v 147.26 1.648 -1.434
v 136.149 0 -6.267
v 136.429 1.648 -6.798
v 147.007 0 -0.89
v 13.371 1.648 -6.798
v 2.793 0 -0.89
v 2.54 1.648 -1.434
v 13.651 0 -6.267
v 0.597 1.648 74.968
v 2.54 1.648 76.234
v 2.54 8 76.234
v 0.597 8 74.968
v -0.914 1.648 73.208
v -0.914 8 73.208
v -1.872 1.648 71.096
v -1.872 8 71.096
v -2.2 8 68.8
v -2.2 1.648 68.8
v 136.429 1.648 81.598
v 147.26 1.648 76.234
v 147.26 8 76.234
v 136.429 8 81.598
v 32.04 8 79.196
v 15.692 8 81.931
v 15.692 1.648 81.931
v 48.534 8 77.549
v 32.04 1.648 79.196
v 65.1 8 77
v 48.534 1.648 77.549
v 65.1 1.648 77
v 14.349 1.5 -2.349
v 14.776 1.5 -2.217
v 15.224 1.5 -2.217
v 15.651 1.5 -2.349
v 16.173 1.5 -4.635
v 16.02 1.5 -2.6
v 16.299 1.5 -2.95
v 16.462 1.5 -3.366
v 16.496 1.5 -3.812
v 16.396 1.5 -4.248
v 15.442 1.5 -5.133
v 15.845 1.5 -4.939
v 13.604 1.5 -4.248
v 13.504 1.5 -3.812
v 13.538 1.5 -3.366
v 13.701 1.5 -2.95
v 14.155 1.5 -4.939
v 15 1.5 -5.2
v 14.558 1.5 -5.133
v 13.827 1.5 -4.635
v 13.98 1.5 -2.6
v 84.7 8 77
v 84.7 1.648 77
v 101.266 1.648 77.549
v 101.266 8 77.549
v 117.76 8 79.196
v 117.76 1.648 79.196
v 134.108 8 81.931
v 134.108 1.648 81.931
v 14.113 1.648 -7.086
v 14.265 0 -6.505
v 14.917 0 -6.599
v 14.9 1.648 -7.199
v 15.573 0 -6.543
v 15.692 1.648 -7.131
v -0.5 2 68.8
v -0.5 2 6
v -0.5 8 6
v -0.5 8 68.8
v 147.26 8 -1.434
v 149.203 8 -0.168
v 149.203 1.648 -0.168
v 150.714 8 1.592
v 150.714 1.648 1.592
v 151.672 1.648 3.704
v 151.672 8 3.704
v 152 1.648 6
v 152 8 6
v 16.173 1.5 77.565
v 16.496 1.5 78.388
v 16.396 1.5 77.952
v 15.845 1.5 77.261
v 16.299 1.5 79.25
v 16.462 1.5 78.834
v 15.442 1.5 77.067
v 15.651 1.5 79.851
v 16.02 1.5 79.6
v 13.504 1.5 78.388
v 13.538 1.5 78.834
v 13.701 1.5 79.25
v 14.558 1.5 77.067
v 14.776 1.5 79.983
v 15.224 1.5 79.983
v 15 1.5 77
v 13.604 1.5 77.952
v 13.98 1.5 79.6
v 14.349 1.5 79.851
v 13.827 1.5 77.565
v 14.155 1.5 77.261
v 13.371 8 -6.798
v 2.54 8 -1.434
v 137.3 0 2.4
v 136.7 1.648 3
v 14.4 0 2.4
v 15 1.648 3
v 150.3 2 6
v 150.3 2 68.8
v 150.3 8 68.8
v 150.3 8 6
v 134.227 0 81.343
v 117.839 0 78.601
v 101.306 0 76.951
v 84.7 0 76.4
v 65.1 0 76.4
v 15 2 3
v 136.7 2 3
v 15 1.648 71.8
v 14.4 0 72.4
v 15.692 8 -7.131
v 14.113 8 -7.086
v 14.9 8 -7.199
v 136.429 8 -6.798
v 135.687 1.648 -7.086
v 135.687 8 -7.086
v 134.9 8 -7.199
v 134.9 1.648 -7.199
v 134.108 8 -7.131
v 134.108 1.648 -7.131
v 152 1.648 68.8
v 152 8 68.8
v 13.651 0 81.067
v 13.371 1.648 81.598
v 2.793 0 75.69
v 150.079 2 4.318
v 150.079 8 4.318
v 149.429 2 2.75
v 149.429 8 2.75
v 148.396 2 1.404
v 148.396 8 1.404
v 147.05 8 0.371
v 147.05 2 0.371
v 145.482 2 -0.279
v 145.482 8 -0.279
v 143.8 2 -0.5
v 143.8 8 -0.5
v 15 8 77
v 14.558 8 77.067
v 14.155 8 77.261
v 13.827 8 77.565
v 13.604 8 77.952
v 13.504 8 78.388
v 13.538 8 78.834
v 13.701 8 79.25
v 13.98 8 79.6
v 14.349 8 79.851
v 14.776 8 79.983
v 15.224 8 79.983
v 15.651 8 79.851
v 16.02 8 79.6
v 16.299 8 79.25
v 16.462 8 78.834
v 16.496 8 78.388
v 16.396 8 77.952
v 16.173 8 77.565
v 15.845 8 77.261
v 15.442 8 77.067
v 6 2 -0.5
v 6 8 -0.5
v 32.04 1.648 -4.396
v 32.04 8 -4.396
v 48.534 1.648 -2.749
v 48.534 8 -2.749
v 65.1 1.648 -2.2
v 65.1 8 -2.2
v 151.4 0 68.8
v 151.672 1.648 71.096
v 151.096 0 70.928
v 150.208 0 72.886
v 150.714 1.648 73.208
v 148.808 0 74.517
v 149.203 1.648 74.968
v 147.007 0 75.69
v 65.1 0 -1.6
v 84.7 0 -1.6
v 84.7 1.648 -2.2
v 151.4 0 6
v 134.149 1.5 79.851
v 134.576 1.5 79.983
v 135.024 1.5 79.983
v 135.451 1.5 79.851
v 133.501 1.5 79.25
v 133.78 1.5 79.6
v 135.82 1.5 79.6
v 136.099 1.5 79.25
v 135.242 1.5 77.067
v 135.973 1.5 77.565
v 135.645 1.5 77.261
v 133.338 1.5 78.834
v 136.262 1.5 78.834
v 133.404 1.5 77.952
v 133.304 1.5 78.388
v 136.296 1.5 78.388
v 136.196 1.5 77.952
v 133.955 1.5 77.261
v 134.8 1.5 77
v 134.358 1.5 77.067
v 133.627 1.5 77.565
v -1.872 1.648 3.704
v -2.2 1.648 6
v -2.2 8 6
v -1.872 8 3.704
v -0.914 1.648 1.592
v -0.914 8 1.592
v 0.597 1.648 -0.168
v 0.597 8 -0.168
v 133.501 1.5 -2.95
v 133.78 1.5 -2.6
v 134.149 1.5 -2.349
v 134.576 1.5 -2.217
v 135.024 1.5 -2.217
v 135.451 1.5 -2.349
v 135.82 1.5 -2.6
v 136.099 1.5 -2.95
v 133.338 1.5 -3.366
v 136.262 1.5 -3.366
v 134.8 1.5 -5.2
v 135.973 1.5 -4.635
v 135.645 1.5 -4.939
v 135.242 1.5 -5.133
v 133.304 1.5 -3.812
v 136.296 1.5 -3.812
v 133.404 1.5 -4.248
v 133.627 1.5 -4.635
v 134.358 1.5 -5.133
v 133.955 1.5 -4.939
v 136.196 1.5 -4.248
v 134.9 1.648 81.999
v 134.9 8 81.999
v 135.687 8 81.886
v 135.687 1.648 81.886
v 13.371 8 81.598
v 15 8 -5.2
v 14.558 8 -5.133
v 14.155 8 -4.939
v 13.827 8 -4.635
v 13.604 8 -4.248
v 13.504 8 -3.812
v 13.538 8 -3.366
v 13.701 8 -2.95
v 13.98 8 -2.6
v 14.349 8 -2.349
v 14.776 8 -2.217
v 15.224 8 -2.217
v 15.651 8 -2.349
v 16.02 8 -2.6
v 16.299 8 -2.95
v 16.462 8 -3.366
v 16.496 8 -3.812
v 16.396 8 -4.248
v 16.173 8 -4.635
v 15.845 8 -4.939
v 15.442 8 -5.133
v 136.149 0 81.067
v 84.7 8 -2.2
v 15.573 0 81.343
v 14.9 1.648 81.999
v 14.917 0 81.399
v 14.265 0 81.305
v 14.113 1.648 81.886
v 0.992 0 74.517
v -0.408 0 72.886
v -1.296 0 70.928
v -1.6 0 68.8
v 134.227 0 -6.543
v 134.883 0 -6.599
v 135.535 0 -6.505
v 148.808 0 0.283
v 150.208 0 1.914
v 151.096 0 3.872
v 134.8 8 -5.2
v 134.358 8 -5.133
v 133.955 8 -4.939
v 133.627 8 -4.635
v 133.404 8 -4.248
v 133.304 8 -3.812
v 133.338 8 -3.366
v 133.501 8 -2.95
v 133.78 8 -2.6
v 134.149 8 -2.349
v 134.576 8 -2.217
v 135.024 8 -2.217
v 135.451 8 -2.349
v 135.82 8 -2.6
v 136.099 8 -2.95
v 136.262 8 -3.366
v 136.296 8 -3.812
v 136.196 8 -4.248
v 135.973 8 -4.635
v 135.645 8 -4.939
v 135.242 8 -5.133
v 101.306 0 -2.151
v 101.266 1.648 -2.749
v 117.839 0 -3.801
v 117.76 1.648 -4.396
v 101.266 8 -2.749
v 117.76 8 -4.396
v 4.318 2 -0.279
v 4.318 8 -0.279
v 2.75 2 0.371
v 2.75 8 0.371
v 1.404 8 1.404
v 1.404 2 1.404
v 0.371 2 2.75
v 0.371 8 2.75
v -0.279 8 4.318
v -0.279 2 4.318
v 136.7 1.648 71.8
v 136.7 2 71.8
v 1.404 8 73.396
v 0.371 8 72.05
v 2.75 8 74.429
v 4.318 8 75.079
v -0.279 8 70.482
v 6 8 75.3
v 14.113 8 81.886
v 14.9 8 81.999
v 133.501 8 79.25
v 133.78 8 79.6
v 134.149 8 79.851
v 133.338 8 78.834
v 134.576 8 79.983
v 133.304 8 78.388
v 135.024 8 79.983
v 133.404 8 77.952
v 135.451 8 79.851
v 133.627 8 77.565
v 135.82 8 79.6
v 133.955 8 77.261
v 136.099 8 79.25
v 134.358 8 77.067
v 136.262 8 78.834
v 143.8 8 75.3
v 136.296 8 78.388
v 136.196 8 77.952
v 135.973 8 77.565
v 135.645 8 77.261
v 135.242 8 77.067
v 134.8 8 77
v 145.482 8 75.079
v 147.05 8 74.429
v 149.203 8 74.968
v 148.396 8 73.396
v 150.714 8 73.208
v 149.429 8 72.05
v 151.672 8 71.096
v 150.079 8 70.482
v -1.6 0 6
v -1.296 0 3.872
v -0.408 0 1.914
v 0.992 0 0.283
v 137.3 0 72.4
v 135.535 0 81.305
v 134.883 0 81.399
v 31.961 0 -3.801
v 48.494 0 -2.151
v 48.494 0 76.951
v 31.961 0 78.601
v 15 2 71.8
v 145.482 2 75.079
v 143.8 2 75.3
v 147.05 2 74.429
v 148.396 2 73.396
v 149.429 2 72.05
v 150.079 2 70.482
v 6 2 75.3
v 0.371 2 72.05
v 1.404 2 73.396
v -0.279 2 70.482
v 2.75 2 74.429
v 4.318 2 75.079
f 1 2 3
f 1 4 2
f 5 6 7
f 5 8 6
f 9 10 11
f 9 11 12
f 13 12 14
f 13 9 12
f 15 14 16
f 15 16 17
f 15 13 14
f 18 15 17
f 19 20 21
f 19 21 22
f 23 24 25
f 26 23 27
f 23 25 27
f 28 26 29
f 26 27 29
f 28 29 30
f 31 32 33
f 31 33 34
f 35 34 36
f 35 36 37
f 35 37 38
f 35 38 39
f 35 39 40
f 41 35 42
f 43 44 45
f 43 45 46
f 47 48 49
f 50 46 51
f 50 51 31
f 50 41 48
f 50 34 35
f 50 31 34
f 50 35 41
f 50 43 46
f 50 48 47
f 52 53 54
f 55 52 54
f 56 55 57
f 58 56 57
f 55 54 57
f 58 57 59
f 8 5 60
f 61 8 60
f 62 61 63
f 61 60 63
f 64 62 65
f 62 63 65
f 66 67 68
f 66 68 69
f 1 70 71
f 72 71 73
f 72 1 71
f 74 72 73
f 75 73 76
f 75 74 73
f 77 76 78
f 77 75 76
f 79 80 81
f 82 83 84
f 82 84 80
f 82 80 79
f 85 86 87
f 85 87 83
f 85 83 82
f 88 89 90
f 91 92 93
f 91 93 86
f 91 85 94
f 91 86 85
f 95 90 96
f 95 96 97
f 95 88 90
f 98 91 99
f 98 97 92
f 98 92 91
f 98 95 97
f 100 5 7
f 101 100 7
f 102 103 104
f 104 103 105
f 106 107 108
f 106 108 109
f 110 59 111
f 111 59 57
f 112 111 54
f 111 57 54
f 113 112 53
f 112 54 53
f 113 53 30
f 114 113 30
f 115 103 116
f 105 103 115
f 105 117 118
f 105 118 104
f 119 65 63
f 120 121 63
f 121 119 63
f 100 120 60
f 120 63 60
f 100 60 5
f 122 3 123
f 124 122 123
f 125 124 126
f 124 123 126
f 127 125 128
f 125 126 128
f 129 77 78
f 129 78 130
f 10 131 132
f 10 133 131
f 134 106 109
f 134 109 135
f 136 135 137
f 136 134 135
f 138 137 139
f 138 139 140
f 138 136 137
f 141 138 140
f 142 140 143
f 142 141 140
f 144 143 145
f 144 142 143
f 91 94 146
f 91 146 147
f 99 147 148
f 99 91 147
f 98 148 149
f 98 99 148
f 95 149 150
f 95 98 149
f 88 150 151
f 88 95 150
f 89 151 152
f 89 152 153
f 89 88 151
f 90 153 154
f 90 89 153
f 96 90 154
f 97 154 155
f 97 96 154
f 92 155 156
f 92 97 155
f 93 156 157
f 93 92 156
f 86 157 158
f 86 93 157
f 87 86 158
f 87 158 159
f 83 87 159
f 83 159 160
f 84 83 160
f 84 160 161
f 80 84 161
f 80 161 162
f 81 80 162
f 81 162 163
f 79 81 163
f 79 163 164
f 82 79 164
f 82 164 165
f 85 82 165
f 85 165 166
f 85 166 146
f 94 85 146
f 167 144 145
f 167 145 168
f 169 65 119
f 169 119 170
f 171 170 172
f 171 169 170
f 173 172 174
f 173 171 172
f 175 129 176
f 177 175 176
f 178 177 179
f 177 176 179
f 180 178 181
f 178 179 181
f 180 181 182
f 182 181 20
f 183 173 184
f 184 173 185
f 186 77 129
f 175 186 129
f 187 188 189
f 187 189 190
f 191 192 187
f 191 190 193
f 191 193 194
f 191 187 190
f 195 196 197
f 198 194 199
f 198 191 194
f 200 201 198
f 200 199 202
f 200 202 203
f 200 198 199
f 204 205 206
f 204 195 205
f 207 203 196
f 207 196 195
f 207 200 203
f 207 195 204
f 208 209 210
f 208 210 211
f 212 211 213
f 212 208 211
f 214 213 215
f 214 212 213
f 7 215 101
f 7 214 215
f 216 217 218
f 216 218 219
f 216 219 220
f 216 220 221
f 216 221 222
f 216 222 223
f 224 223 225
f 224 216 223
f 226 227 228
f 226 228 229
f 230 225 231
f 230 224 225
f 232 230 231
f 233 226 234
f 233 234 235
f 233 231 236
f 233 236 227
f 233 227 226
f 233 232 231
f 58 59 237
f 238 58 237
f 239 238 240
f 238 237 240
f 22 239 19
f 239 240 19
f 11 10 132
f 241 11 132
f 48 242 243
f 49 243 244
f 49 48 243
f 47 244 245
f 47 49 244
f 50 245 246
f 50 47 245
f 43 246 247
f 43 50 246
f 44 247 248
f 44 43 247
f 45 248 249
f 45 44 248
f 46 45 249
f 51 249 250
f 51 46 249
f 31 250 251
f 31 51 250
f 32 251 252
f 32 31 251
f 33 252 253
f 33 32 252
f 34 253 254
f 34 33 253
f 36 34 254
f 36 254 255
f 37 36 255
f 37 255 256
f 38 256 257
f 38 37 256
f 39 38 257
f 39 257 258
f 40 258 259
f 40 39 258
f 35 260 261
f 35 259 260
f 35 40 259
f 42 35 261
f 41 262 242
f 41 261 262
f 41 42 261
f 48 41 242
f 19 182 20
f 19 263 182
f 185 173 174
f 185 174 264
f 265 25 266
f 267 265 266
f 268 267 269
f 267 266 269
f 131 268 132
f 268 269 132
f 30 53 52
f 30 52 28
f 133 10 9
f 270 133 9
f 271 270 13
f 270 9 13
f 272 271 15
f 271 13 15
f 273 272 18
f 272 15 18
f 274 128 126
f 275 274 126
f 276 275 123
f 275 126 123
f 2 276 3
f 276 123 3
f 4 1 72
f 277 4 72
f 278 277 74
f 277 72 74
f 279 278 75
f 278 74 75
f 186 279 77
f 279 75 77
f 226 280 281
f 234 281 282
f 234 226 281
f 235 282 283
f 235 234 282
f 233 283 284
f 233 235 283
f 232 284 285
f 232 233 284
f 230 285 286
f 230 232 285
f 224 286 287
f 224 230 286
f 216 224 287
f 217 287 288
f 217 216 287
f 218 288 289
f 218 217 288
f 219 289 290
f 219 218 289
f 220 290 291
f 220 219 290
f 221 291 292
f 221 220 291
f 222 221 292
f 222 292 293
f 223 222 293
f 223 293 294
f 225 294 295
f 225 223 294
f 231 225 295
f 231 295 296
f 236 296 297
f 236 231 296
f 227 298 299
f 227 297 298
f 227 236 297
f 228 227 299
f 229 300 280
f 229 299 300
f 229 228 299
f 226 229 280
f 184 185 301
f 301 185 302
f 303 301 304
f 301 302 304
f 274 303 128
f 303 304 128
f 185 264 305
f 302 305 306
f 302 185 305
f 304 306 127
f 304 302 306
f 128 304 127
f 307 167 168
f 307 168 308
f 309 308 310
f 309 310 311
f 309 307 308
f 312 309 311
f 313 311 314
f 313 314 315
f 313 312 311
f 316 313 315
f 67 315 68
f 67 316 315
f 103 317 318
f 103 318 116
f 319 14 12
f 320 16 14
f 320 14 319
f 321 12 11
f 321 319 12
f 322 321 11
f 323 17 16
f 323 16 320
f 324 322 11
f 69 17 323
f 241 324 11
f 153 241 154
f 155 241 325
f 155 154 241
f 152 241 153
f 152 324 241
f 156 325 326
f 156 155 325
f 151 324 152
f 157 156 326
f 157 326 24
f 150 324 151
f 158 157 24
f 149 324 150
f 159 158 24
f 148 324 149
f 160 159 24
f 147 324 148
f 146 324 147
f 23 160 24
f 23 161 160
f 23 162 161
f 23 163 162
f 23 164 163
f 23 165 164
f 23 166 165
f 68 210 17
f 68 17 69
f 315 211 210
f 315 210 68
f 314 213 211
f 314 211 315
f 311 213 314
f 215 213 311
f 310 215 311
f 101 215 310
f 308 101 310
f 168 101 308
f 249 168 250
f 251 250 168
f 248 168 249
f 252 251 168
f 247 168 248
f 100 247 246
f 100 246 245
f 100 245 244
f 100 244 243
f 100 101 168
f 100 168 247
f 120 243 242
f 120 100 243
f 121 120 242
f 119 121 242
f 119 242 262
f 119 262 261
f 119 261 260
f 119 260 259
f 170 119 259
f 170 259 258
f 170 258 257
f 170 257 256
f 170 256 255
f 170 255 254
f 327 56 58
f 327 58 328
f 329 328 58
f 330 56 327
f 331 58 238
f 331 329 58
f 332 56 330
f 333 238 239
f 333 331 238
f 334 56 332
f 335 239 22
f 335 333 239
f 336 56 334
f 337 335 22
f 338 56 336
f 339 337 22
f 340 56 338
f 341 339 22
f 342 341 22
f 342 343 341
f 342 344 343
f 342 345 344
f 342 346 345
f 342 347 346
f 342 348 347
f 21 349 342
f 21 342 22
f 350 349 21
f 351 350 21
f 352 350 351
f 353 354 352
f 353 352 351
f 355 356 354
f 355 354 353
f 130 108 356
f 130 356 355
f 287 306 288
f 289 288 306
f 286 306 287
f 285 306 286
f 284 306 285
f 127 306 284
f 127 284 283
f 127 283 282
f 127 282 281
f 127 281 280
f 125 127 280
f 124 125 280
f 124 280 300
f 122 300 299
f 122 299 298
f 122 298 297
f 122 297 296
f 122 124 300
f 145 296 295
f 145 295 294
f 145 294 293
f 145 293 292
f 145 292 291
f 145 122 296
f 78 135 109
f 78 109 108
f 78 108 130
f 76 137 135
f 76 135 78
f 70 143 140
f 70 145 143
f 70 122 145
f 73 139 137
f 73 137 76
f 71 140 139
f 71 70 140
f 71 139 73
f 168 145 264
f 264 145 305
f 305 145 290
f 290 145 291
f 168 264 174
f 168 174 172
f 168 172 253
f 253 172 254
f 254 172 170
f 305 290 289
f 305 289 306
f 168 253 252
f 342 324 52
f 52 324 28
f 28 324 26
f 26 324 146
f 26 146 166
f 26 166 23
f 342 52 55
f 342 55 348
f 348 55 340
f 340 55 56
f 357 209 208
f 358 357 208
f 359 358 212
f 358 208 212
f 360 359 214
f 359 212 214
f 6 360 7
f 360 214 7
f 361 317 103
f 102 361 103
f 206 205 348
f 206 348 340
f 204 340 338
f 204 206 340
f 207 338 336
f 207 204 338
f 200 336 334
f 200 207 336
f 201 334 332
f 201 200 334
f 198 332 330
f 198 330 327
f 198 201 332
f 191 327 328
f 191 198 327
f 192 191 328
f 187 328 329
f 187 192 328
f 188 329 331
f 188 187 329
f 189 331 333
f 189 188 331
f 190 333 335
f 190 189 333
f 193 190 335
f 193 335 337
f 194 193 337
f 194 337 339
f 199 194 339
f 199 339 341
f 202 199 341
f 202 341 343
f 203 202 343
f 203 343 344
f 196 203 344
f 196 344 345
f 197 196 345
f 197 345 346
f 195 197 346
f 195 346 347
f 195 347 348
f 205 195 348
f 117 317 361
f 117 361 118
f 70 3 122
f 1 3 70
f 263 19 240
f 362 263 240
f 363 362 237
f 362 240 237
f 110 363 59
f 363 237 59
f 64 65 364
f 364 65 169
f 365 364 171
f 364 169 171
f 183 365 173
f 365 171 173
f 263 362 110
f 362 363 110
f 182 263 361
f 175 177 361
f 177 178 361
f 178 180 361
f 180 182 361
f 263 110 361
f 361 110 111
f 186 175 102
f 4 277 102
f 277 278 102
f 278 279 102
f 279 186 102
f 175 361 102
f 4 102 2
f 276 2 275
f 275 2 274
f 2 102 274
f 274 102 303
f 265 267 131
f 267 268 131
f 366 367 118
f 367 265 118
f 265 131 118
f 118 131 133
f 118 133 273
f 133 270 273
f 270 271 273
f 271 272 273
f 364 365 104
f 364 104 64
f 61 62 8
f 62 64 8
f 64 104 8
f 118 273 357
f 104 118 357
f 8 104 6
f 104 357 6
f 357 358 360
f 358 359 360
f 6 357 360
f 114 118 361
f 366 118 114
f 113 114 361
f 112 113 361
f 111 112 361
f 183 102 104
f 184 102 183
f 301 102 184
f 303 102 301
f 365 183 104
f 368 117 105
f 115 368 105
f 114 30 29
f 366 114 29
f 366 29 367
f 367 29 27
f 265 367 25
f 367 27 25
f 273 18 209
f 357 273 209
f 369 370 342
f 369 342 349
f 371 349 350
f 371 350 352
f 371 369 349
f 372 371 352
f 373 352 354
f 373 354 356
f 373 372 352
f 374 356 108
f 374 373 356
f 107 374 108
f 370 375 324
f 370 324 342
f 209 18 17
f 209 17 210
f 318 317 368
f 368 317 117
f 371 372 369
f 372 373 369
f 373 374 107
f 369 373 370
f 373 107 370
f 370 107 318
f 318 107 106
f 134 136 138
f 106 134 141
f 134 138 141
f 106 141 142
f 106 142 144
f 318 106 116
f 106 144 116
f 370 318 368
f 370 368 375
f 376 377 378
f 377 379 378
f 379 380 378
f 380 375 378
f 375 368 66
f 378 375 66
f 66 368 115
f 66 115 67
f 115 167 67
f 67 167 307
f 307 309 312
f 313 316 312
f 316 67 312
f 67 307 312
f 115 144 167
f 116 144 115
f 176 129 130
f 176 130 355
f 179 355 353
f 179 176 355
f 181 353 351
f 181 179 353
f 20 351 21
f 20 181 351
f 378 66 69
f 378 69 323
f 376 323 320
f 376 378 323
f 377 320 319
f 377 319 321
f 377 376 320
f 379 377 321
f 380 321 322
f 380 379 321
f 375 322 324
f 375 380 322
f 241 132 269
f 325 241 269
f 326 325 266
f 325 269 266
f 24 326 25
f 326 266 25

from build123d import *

# Parameters (mm, degrees)
EXTRUDE_1_DEPTH       = 2
EXTRUDE_2_DEPTH       = 8
SKETCH_6_R            = 3.5
SKETCH_6_R_2          = 1.5
EXTRUDE_10_DEPTH      = 8
SKETCH_7_W            = 121.7
SKETCH_7_H            = 68.8
CUT_EXTRUDE_1_DEPTH   = 10
FILLET_1_R            = 250
SKETCH_6_2_R          = 1.5
EXTRUDE_11_DEPTH      = 1.5
CHAMFER_1_SIZE        = 0.6
CHAMFER_1_SIZE2       = 1.648486452
CUT_EXTRUDE_START     = -6
CUT_EXTRUDE_1_2_DEPTH = 6


with BuildPart() as part:
    # 草图1 → 凸台-拉伸1 (new body)
    with BuildSketch(Plane(origin=(0, 0, 0), x_dir=(1, 0, 0), z_dir=(0, 1, 0))):
        with BuildLine():
            Line((6, 0.2), (143.8, 0.2))
            ThreePointArc((143.8, 0.2), (148.184062043, -1.615937957), (150, -6))
            Line((150, -6), (150, -68.8))
            ThreePointArc((150, -68.8), (148.184062043, -73.184062043), (143.8, -75))
            Line((143.8, -75), (6, -75))
            ThreePointArc((6, -75), (1.615937957, -73.184062043), (-0.2, -68.8))
            Line((-0.2, -68.8), (-0.2, -6))
            ThreePointArc((-0.2, -6), (1.615937957, -1.615937957), (6, 0.2))
        make_face()
    extrude(amount=EXTRUDE_1_DEPTH)

    # 草图1<5> → 拉伸-薄壁2 (add)
    with BuildSketch(Plane(origin=(0, 0, 0), x_dir=(1, 0, 0), z_dir=(0, 1, 0))):
        with BuildLine():
            Line((6, 2.2), (143.8, 2.2))
            ThreePointArc((143.8, 2.2), (149.598275606, -0.201724394), (152, -6))
            Line((152, -6), (152, -68.8))
            ThreePointArc((152, -68.8), (149.598275606, -74.598275606), (143.8, -77))
            Line((143.8, -77), (6, -77))
            ThreePointArc((6, -77), (0.201724394, -74.598275606), (-2.2, -68.8))
            Line((-2.2, -68.8), (-2.2, -6))
            ThreePointArc((-2.2, -6), (0.201724394, -0.201724394), (6, 2.2))
        make_face()
        with BuildLine():
            Line((6, 0.2), (143.8, 0.2))
            ThreePointArc((143.8, 0.2), (148.184062043, -1.615937957), (150, -6))
            Line((150, -6), (150, -68.8))
            ThreePointArc((150, -68.8), (148.184062043, -73.184062043), (143.8, -75))
            Line((143.8, -75), (6, -75))
            ThreePointArc((6, -75), (1.615937957, -73.184062043), (-0.2, -68.8))
            Line((-0.2, -68.8), (-0.2, -6))
            ThreePointArc((-0.2, -6), (1.615937957, -1.615937957), (6, 0.2))
        make_face(mode=Mode.SUBTRACT)
    extrude(amount=EXTRUDE_2_DEPTH)

    # 草图6 → 凸台-拉伸10 (add)
    # profile 1 of 4: a face of its own
    with BuildSketch(Plane(origin=(0, 0, 0), x_dir=(1, 0, 0), z_dir=(0, 1, 0))):
        with Locations((15, 3.7)):
            Circle(SKETCH_6_R)
        with Locations(Location((15, 3.7, 0), (0, 0, 90))):
            Circle(SKETCH_6_R_2, mode=Mode.SUBTRACT)
    # profile 2 of 4: a face of its own
    with BuildSketch(Plane(origin=(0, 0, 0), x_dir=(1, 0, 0), z_dir=(0, 1, 0))):
        with Locations((15, -78.5)):
            Circle(SKETCH_6_R)
        with Locations(Location((15, -78.5, 0), (0, 0, 90))):
            Circle(SKETCH_6_R_2, mode=Mode.SUBTRACT)
    # profile 3 of 4: a face of its own
    with BuildSketch(Plane(origin=(0, 0, 0), x_dir=(1, 0, 0), z_dir=(0, 1, 0))):
        with Locations((134.8, 3.7)):
            Circle(SKETCH_6_R)
        with Locations(Location((134.8, 3.7, 0), (0, 0, 90))):
            Circle(SKETCH_6_R_2, mode=Mode.SUBTRACT)
    # profile 4 of 4: a face of its own
    with BuildSketch(Plane(origin=(0, 0, 0), x_dir=(1, 0, 0), z_dir=(0, 1, 0))):
        with Locations((134.8, -78.5)):
            Circle(SKETCH_6_R)
        with Locations(Location((134.8, -78.5, 0), (0, 0, 90))):
            Circle(SKETCH_6_R_2, mode=Mode.SUBTRACT)
    extrude(amount=EXTRUDE_10_DEPTH)

    # 草图7 → Cut-Extrude 1 (cut)
    with BuildSketch(Plane(origin=(0, 0, 0), x_dir=(-1, 0, 0), z_dir=(0, -1, 0))):
        with Locations((-75.85, -37.4)):
            Rectangle(SKETCH_7_W, SKETCH_7_H)
    extrude(amount=-CUT_EXTRUDE_1_DEPTH, mode=Mode.SUBTRACT)

    # 圆角1
    fillet_1_edges = [part.edges().sort_by_distance(p)[0] for p in [
        (18.16227766, 4, 77),
        (11.83772234, 4, 77),
        (137.96227766, 4, 77),
        (131.63772234, 4, 77),
        (131.63772234, 4, -2.2),
        (137.96227766, 4, -2.2),
        (11.83772234, 4, -2.2),
        (18.16227766, 4, -2.2),
    ]]
    fillet(fillet_1_edges, radius=FILLET_1_R)

    # 草图6<2> → 凸台-拉伸11 (add)
    with BuildSketch(Plane(origin=(0, 0, 0), x_dir=(1, 0, 0), z_dir=(0, 1, 0))):
        with Locations(Location((15, 3.7, 0), (0, 0, 90))):
            Circle(SKETCH_6_2_R)
        with Locations(Location((15, -78.5, 0), (0, 0, 90))):
            Circle(SKETCH_6_2_R)
        with Locations(Location((134.8, 3.7, 0), (0, 0, 90))):
            Circle(SKETCH_6_2_R)
        with Locations(Location((134.8, -78.5, 0), (0, 0, 90))):
            Circle(SKETCH_6_2_R)
    extrude(amount=EXTRUDE_11_DEPTH)

    # 倒角1
    chamfer_1_edges = [part.edges().sort_by_distance(p)[0] for p in [
        (136.7, 0, 37.4),
        (75.85, 0, 71.8),
        (15, 0, 37.4),
        (75.85, 0, 3),
        (14.502874151, 0, 81.964515246),
        (74.9, 0, 77),
        (135.297125849, 0, 81.964515246),
        (150.714252509, 0, 73.20830038),
        (135.297125849, 0, -7.164515246),
        (74.9, 0, -2.2),
        (14.502874151, 0, -7.164515246),
        (-0.914252509, 0, 1.59169962),
        (7.988030543, 0, 78.850628869),
        (40.273083878, 0, 78.235796001),
        (141.811969457, 0, 78.850628869),
        (109.526916122, 0, 78.235796001),
        (141.811969457, 0, -4.050628869),
        (109.526916122, 0, -3.435796001),
        (7.988030543, 0, -4.050628869),
        (40.273083878, 0, -3.435796001),
        (-2.2, 0, 37.4),
        (-0.914252509, 0, 73.20830038),
        (152, 0, 37.4),
        (150.714252509, 0, 1.59169962),
    ]]
    chamfer_1_side = [part.faces().sort_by_distance(p)[0] for p in [
        (0.58783664, 0, 72.250617658),
    ]]
    chamfer(chamfer_1_edges, length=CHAMFER_1_SIZE, length2=CHAMFER_1_SIZE2, reference=chamfer_1_side[0])

    # 草图11 → Cut-Extrude 1 2 (cut)
    with BuildSketch(Plane(origin=(0, 8, 0), x_dir=(1, 0, 0), z_dir=(0, 1, 0)).offset(CUT_EXTRUDE_START)):
        with BuildLine():
            Line((143.8, 0.5), (6, 0.5))
            ThreePointArc((6, 0.5), (1.403805922, -1.403805922), (-0.5, -6))
            Line((-0.5, -6), (-0.5, -68.8))
            ThreePointArc((-0.5, -68.8), (1.403805922, -73.396194078), (6, -75.3))
            Line((6, -75.3), (143.8, -75.3))
            ThreePointArc((143.8, -75.3), (148.396194078, -73.396194078), (150.3, -68.8))
            Line((150.3, -68.8), (150.3, -6))
            ThreePointArc((150.3, -6), (148.396194078, -1.403805922), (143.8, 0.5))
        make_face()
        with BuildLine():
            Line((143.8, 0.2), (6, 0.2))
            ThreePointArc((6, 0.2), (1.615937957, -1.615937957), (-0.2, -6))
            Line((-0.2, -6), (-0.2, -68.8))
            ThreePointArc((-0.2, -68.8), (1.615937957, -73.184062043), (6, -75))
            Line((6, -75), (143.8, -75))
            ThreePointArc((143.8, -75), (148.184062043, -73.184062043), (150, -68.8))
            Line((150, -68.8), (150, -6))
            ThreePointArc((150, -6), (148.184062043, -1.615937957), (143.8, 0.2))
        make_face(mode=Mode.SUBTRACT)
    extrude(amount=CUT_EXTRUDE_1_2_DEPTH, mode=Mode.SUBTRACT)


solid = part.part
